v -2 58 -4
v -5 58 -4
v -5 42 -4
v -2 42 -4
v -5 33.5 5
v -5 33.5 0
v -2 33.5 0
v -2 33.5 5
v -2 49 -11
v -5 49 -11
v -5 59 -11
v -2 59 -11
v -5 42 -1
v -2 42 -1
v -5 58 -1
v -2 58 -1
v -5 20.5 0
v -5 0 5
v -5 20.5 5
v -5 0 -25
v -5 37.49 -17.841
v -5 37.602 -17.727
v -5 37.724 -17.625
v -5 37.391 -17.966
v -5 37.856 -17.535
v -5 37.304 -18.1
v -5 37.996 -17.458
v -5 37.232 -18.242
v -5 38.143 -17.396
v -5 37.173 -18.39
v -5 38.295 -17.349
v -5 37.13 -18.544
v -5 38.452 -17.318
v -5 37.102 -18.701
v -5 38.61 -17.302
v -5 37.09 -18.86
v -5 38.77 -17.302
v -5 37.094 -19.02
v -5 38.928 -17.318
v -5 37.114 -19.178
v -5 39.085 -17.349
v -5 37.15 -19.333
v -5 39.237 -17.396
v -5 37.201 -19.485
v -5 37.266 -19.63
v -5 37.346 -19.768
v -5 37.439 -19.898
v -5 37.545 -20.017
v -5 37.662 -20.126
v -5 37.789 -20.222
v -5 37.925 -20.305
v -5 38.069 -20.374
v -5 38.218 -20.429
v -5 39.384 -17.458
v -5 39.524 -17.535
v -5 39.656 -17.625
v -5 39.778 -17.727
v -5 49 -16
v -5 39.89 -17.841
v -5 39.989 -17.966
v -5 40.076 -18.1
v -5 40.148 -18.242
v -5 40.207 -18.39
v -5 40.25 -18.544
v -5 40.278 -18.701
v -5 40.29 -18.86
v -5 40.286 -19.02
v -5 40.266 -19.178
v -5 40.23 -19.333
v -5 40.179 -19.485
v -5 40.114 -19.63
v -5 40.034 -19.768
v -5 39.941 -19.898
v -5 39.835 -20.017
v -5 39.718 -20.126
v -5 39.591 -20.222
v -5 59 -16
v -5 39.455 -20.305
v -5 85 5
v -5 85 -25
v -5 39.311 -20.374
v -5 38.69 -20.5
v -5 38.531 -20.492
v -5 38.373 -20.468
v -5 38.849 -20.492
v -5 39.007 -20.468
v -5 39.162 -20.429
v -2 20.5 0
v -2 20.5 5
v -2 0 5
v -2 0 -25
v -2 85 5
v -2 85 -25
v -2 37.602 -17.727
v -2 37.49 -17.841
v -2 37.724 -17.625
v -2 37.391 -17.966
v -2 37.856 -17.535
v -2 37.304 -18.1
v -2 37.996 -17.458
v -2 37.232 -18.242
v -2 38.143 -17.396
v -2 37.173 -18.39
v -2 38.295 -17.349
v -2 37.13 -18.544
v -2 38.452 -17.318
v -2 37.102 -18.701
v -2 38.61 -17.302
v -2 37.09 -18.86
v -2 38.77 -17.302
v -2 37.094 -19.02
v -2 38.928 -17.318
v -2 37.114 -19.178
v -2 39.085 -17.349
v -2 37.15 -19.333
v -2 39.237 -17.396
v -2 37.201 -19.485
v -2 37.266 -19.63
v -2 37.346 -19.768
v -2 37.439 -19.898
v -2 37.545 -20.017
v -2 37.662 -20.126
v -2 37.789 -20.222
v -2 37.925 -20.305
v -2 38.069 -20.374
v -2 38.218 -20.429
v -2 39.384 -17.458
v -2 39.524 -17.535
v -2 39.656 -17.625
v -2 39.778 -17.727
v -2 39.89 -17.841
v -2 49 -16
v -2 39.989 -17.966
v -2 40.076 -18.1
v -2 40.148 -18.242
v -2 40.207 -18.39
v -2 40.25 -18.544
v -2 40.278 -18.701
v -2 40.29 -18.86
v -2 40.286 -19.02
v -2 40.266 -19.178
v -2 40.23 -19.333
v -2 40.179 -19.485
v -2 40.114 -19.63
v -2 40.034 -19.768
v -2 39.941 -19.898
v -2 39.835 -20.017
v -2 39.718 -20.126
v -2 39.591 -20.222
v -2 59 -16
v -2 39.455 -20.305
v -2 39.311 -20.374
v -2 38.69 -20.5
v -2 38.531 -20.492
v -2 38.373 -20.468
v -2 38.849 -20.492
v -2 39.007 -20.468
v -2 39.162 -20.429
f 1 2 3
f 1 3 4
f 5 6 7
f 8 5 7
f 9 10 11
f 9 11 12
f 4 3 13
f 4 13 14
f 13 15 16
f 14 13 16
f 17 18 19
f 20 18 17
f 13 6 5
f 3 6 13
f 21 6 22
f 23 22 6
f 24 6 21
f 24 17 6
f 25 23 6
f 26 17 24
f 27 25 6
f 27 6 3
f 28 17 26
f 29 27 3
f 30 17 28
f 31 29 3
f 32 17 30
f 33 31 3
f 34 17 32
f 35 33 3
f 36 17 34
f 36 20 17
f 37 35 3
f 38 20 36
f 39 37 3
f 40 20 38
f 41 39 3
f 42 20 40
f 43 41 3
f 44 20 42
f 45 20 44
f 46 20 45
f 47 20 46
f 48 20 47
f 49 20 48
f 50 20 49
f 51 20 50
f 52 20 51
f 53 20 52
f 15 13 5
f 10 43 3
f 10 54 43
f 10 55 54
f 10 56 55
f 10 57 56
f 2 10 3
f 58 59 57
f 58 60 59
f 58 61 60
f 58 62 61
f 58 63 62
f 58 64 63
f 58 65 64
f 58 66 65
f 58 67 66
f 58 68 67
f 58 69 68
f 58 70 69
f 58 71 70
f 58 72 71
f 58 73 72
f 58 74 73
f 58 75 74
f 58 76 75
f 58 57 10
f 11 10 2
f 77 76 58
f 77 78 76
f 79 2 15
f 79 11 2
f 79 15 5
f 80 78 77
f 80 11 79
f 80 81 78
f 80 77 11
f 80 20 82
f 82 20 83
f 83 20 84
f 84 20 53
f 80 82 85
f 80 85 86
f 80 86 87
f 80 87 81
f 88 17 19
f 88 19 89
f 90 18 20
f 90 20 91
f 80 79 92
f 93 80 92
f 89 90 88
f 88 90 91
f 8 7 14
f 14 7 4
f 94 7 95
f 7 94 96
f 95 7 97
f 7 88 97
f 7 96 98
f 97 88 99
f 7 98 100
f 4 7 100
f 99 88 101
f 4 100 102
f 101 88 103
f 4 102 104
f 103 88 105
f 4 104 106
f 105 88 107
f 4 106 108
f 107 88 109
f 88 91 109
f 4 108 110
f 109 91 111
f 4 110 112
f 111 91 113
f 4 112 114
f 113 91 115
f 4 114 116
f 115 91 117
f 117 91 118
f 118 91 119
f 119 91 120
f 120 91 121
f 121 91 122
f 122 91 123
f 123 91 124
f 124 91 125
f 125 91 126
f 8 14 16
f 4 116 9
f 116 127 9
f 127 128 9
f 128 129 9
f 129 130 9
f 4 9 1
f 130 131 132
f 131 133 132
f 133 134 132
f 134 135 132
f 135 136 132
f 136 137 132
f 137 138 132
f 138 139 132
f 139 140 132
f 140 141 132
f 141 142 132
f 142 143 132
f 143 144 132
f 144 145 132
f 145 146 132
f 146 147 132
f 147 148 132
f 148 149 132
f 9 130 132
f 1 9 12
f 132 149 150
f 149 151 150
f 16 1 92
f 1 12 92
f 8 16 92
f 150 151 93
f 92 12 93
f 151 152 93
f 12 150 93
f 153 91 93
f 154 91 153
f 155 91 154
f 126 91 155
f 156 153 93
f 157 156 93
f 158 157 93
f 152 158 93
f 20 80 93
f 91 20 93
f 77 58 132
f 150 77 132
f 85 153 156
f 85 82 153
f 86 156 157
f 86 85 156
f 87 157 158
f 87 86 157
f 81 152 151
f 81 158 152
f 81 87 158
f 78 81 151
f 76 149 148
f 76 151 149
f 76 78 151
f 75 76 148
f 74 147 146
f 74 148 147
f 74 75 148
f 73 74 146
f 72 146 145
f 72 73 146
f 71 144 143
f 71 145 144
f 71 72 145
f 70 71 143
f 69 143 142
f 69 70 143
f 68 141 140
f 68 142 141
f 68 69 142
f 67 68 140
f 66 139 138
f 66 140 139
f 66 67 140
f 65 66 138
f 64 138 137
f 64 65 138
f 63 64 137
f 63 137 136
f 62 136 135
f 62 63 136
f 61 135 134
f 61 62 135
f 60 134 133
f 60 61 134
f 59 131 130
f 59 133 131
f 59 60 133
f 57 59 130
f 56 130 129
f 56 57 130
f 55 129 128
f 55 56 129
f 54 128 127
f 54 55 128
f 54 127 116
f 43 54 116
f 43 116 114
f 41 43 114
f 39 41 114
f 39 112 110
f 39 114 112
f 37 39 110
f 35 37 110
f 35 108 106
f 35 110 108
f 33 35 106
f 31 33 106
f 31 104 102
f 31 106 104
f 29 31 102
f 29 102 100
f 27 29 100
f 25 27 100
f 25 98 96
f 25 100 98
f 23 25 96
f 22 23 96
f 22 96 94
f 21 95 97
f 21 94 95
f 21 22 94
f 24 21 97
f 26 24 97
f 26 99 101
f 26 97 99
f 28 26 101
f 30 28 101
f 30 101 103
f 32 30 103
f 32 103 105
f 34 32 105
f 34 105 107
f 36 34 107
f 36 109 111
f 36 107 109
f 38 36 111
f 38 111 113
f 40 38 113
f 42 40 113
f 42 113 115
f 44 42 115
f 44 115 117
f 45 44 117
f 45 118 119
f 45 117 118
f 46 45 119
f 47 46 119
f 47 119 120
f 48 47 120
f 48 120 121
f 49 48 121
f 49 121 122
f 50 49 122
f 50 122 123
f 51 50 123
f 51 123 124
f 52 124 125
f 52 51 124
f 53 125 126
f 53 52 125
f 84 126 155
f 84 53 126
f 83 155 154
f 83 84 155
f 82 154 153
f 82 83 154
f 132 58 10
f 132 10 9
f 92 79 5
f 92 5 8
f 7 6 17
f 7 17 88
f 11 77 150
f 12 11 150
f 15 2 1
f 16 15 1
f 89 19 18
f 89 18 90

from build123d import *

# Parameters (mm, degrees)
CYLINDER026_R           = 1.6
CYLINDER026_DEPTH       = 10
CYLINDER026_PITCH_ANGLE = 90
BOX008_W                = 17
BOX008_H                = 10
BOX008_DEPTH            = 5
BOX019_W                = 6
BOX019_H                = 16
BOX019_DEPTH            = 3
BOX007_W                = 17
BOX007_H                = 13
BOX007_DEPTH            = 10
BOX002_W                = 3
BOX002_H                = 85
BOX002_DEPTH            = 30


with BuildPart() as front_hole:
    # Cylinder026 → Cylinder026 (new body)
    with BuildSketch(Plane.XY):
        Circle(CYLINDER026_R)
    extrude(amount=CYLINDER026_DEPTH)


with BuildPart() as front_hole_1:
    # Cylinder026 pitch: moved
    add(front_hole.part.rotate(Axis((0, 0, 0), (0, 1, 0)), CYLINDER026_PITCH_ANGLE))


with BuildPart() as front_hole_2:
    # Cylinder026 placement: moved
    add(front_hole_1.part.moved(Location((-7.4, 38.69, -18.9))))


with BuildPart() as usb_connector002:
    # Box008 → Box008 (new body)
    with BuildSketch(Plane(origin=(-11, 49, -16), x_dir=(1, 0, 0), z_dir=(0, 0, 1))):
        with Locations((8.5, 5)):
            Rectangle(BOX008_W, BOX008_H)
    extrude(amount=BOX008_DEPTH)


with BuildPart() as sd_card_reader:
    # Box019 → Box019 (new body)
    with BuildSketch(Plane(origin=(-8, 42, -4), x_dir=(1, 0, 0), z_dir=(0, 0, 1))):
        with Locations((3, 8)):
            Rectangle(BOX019_W, BOX019_H)
    extrude(amount=BOX019_DEPTH)


with BuildPart() as fusion:
    # Box007 → Box007 (new body)
    with BuildSketch(Plane(origin=(-11, 20.5, 0), x_dir=(1, 0, 0), z_dir=(0, 0, 1))):
        with Locations((8.5, 6.5)):
            Rectangle(BOX007_W, BOX007_H)
    extrude(amount=BOX007_DEPTH)

    # Fusion: union USB connector002, SD card reader
    add(usb_connector002.part)
    add(sd_card_reader.part)


with BuildPart() as final_front:
    # Box002 → Box002 (new body)
    with BuildSketch(Plane(origin=(-5, 0, -25), x_dir=(1, 0, 0), z_dir=(0, 0, 1))):
        with Locations((1.5, 42.5)):
            Rectangle(BOX002_W, BOX002_H)
    extrude(amount=BOX002_DEPTH)

    # Cut: cut Fusion
    add(fusion.part, mode=Mode.SUBTRACT)

    # Cut027: cut front hole
    add(front_hole_2.part, mode=Mode.SUBTRACT)


solid = final_front.part
